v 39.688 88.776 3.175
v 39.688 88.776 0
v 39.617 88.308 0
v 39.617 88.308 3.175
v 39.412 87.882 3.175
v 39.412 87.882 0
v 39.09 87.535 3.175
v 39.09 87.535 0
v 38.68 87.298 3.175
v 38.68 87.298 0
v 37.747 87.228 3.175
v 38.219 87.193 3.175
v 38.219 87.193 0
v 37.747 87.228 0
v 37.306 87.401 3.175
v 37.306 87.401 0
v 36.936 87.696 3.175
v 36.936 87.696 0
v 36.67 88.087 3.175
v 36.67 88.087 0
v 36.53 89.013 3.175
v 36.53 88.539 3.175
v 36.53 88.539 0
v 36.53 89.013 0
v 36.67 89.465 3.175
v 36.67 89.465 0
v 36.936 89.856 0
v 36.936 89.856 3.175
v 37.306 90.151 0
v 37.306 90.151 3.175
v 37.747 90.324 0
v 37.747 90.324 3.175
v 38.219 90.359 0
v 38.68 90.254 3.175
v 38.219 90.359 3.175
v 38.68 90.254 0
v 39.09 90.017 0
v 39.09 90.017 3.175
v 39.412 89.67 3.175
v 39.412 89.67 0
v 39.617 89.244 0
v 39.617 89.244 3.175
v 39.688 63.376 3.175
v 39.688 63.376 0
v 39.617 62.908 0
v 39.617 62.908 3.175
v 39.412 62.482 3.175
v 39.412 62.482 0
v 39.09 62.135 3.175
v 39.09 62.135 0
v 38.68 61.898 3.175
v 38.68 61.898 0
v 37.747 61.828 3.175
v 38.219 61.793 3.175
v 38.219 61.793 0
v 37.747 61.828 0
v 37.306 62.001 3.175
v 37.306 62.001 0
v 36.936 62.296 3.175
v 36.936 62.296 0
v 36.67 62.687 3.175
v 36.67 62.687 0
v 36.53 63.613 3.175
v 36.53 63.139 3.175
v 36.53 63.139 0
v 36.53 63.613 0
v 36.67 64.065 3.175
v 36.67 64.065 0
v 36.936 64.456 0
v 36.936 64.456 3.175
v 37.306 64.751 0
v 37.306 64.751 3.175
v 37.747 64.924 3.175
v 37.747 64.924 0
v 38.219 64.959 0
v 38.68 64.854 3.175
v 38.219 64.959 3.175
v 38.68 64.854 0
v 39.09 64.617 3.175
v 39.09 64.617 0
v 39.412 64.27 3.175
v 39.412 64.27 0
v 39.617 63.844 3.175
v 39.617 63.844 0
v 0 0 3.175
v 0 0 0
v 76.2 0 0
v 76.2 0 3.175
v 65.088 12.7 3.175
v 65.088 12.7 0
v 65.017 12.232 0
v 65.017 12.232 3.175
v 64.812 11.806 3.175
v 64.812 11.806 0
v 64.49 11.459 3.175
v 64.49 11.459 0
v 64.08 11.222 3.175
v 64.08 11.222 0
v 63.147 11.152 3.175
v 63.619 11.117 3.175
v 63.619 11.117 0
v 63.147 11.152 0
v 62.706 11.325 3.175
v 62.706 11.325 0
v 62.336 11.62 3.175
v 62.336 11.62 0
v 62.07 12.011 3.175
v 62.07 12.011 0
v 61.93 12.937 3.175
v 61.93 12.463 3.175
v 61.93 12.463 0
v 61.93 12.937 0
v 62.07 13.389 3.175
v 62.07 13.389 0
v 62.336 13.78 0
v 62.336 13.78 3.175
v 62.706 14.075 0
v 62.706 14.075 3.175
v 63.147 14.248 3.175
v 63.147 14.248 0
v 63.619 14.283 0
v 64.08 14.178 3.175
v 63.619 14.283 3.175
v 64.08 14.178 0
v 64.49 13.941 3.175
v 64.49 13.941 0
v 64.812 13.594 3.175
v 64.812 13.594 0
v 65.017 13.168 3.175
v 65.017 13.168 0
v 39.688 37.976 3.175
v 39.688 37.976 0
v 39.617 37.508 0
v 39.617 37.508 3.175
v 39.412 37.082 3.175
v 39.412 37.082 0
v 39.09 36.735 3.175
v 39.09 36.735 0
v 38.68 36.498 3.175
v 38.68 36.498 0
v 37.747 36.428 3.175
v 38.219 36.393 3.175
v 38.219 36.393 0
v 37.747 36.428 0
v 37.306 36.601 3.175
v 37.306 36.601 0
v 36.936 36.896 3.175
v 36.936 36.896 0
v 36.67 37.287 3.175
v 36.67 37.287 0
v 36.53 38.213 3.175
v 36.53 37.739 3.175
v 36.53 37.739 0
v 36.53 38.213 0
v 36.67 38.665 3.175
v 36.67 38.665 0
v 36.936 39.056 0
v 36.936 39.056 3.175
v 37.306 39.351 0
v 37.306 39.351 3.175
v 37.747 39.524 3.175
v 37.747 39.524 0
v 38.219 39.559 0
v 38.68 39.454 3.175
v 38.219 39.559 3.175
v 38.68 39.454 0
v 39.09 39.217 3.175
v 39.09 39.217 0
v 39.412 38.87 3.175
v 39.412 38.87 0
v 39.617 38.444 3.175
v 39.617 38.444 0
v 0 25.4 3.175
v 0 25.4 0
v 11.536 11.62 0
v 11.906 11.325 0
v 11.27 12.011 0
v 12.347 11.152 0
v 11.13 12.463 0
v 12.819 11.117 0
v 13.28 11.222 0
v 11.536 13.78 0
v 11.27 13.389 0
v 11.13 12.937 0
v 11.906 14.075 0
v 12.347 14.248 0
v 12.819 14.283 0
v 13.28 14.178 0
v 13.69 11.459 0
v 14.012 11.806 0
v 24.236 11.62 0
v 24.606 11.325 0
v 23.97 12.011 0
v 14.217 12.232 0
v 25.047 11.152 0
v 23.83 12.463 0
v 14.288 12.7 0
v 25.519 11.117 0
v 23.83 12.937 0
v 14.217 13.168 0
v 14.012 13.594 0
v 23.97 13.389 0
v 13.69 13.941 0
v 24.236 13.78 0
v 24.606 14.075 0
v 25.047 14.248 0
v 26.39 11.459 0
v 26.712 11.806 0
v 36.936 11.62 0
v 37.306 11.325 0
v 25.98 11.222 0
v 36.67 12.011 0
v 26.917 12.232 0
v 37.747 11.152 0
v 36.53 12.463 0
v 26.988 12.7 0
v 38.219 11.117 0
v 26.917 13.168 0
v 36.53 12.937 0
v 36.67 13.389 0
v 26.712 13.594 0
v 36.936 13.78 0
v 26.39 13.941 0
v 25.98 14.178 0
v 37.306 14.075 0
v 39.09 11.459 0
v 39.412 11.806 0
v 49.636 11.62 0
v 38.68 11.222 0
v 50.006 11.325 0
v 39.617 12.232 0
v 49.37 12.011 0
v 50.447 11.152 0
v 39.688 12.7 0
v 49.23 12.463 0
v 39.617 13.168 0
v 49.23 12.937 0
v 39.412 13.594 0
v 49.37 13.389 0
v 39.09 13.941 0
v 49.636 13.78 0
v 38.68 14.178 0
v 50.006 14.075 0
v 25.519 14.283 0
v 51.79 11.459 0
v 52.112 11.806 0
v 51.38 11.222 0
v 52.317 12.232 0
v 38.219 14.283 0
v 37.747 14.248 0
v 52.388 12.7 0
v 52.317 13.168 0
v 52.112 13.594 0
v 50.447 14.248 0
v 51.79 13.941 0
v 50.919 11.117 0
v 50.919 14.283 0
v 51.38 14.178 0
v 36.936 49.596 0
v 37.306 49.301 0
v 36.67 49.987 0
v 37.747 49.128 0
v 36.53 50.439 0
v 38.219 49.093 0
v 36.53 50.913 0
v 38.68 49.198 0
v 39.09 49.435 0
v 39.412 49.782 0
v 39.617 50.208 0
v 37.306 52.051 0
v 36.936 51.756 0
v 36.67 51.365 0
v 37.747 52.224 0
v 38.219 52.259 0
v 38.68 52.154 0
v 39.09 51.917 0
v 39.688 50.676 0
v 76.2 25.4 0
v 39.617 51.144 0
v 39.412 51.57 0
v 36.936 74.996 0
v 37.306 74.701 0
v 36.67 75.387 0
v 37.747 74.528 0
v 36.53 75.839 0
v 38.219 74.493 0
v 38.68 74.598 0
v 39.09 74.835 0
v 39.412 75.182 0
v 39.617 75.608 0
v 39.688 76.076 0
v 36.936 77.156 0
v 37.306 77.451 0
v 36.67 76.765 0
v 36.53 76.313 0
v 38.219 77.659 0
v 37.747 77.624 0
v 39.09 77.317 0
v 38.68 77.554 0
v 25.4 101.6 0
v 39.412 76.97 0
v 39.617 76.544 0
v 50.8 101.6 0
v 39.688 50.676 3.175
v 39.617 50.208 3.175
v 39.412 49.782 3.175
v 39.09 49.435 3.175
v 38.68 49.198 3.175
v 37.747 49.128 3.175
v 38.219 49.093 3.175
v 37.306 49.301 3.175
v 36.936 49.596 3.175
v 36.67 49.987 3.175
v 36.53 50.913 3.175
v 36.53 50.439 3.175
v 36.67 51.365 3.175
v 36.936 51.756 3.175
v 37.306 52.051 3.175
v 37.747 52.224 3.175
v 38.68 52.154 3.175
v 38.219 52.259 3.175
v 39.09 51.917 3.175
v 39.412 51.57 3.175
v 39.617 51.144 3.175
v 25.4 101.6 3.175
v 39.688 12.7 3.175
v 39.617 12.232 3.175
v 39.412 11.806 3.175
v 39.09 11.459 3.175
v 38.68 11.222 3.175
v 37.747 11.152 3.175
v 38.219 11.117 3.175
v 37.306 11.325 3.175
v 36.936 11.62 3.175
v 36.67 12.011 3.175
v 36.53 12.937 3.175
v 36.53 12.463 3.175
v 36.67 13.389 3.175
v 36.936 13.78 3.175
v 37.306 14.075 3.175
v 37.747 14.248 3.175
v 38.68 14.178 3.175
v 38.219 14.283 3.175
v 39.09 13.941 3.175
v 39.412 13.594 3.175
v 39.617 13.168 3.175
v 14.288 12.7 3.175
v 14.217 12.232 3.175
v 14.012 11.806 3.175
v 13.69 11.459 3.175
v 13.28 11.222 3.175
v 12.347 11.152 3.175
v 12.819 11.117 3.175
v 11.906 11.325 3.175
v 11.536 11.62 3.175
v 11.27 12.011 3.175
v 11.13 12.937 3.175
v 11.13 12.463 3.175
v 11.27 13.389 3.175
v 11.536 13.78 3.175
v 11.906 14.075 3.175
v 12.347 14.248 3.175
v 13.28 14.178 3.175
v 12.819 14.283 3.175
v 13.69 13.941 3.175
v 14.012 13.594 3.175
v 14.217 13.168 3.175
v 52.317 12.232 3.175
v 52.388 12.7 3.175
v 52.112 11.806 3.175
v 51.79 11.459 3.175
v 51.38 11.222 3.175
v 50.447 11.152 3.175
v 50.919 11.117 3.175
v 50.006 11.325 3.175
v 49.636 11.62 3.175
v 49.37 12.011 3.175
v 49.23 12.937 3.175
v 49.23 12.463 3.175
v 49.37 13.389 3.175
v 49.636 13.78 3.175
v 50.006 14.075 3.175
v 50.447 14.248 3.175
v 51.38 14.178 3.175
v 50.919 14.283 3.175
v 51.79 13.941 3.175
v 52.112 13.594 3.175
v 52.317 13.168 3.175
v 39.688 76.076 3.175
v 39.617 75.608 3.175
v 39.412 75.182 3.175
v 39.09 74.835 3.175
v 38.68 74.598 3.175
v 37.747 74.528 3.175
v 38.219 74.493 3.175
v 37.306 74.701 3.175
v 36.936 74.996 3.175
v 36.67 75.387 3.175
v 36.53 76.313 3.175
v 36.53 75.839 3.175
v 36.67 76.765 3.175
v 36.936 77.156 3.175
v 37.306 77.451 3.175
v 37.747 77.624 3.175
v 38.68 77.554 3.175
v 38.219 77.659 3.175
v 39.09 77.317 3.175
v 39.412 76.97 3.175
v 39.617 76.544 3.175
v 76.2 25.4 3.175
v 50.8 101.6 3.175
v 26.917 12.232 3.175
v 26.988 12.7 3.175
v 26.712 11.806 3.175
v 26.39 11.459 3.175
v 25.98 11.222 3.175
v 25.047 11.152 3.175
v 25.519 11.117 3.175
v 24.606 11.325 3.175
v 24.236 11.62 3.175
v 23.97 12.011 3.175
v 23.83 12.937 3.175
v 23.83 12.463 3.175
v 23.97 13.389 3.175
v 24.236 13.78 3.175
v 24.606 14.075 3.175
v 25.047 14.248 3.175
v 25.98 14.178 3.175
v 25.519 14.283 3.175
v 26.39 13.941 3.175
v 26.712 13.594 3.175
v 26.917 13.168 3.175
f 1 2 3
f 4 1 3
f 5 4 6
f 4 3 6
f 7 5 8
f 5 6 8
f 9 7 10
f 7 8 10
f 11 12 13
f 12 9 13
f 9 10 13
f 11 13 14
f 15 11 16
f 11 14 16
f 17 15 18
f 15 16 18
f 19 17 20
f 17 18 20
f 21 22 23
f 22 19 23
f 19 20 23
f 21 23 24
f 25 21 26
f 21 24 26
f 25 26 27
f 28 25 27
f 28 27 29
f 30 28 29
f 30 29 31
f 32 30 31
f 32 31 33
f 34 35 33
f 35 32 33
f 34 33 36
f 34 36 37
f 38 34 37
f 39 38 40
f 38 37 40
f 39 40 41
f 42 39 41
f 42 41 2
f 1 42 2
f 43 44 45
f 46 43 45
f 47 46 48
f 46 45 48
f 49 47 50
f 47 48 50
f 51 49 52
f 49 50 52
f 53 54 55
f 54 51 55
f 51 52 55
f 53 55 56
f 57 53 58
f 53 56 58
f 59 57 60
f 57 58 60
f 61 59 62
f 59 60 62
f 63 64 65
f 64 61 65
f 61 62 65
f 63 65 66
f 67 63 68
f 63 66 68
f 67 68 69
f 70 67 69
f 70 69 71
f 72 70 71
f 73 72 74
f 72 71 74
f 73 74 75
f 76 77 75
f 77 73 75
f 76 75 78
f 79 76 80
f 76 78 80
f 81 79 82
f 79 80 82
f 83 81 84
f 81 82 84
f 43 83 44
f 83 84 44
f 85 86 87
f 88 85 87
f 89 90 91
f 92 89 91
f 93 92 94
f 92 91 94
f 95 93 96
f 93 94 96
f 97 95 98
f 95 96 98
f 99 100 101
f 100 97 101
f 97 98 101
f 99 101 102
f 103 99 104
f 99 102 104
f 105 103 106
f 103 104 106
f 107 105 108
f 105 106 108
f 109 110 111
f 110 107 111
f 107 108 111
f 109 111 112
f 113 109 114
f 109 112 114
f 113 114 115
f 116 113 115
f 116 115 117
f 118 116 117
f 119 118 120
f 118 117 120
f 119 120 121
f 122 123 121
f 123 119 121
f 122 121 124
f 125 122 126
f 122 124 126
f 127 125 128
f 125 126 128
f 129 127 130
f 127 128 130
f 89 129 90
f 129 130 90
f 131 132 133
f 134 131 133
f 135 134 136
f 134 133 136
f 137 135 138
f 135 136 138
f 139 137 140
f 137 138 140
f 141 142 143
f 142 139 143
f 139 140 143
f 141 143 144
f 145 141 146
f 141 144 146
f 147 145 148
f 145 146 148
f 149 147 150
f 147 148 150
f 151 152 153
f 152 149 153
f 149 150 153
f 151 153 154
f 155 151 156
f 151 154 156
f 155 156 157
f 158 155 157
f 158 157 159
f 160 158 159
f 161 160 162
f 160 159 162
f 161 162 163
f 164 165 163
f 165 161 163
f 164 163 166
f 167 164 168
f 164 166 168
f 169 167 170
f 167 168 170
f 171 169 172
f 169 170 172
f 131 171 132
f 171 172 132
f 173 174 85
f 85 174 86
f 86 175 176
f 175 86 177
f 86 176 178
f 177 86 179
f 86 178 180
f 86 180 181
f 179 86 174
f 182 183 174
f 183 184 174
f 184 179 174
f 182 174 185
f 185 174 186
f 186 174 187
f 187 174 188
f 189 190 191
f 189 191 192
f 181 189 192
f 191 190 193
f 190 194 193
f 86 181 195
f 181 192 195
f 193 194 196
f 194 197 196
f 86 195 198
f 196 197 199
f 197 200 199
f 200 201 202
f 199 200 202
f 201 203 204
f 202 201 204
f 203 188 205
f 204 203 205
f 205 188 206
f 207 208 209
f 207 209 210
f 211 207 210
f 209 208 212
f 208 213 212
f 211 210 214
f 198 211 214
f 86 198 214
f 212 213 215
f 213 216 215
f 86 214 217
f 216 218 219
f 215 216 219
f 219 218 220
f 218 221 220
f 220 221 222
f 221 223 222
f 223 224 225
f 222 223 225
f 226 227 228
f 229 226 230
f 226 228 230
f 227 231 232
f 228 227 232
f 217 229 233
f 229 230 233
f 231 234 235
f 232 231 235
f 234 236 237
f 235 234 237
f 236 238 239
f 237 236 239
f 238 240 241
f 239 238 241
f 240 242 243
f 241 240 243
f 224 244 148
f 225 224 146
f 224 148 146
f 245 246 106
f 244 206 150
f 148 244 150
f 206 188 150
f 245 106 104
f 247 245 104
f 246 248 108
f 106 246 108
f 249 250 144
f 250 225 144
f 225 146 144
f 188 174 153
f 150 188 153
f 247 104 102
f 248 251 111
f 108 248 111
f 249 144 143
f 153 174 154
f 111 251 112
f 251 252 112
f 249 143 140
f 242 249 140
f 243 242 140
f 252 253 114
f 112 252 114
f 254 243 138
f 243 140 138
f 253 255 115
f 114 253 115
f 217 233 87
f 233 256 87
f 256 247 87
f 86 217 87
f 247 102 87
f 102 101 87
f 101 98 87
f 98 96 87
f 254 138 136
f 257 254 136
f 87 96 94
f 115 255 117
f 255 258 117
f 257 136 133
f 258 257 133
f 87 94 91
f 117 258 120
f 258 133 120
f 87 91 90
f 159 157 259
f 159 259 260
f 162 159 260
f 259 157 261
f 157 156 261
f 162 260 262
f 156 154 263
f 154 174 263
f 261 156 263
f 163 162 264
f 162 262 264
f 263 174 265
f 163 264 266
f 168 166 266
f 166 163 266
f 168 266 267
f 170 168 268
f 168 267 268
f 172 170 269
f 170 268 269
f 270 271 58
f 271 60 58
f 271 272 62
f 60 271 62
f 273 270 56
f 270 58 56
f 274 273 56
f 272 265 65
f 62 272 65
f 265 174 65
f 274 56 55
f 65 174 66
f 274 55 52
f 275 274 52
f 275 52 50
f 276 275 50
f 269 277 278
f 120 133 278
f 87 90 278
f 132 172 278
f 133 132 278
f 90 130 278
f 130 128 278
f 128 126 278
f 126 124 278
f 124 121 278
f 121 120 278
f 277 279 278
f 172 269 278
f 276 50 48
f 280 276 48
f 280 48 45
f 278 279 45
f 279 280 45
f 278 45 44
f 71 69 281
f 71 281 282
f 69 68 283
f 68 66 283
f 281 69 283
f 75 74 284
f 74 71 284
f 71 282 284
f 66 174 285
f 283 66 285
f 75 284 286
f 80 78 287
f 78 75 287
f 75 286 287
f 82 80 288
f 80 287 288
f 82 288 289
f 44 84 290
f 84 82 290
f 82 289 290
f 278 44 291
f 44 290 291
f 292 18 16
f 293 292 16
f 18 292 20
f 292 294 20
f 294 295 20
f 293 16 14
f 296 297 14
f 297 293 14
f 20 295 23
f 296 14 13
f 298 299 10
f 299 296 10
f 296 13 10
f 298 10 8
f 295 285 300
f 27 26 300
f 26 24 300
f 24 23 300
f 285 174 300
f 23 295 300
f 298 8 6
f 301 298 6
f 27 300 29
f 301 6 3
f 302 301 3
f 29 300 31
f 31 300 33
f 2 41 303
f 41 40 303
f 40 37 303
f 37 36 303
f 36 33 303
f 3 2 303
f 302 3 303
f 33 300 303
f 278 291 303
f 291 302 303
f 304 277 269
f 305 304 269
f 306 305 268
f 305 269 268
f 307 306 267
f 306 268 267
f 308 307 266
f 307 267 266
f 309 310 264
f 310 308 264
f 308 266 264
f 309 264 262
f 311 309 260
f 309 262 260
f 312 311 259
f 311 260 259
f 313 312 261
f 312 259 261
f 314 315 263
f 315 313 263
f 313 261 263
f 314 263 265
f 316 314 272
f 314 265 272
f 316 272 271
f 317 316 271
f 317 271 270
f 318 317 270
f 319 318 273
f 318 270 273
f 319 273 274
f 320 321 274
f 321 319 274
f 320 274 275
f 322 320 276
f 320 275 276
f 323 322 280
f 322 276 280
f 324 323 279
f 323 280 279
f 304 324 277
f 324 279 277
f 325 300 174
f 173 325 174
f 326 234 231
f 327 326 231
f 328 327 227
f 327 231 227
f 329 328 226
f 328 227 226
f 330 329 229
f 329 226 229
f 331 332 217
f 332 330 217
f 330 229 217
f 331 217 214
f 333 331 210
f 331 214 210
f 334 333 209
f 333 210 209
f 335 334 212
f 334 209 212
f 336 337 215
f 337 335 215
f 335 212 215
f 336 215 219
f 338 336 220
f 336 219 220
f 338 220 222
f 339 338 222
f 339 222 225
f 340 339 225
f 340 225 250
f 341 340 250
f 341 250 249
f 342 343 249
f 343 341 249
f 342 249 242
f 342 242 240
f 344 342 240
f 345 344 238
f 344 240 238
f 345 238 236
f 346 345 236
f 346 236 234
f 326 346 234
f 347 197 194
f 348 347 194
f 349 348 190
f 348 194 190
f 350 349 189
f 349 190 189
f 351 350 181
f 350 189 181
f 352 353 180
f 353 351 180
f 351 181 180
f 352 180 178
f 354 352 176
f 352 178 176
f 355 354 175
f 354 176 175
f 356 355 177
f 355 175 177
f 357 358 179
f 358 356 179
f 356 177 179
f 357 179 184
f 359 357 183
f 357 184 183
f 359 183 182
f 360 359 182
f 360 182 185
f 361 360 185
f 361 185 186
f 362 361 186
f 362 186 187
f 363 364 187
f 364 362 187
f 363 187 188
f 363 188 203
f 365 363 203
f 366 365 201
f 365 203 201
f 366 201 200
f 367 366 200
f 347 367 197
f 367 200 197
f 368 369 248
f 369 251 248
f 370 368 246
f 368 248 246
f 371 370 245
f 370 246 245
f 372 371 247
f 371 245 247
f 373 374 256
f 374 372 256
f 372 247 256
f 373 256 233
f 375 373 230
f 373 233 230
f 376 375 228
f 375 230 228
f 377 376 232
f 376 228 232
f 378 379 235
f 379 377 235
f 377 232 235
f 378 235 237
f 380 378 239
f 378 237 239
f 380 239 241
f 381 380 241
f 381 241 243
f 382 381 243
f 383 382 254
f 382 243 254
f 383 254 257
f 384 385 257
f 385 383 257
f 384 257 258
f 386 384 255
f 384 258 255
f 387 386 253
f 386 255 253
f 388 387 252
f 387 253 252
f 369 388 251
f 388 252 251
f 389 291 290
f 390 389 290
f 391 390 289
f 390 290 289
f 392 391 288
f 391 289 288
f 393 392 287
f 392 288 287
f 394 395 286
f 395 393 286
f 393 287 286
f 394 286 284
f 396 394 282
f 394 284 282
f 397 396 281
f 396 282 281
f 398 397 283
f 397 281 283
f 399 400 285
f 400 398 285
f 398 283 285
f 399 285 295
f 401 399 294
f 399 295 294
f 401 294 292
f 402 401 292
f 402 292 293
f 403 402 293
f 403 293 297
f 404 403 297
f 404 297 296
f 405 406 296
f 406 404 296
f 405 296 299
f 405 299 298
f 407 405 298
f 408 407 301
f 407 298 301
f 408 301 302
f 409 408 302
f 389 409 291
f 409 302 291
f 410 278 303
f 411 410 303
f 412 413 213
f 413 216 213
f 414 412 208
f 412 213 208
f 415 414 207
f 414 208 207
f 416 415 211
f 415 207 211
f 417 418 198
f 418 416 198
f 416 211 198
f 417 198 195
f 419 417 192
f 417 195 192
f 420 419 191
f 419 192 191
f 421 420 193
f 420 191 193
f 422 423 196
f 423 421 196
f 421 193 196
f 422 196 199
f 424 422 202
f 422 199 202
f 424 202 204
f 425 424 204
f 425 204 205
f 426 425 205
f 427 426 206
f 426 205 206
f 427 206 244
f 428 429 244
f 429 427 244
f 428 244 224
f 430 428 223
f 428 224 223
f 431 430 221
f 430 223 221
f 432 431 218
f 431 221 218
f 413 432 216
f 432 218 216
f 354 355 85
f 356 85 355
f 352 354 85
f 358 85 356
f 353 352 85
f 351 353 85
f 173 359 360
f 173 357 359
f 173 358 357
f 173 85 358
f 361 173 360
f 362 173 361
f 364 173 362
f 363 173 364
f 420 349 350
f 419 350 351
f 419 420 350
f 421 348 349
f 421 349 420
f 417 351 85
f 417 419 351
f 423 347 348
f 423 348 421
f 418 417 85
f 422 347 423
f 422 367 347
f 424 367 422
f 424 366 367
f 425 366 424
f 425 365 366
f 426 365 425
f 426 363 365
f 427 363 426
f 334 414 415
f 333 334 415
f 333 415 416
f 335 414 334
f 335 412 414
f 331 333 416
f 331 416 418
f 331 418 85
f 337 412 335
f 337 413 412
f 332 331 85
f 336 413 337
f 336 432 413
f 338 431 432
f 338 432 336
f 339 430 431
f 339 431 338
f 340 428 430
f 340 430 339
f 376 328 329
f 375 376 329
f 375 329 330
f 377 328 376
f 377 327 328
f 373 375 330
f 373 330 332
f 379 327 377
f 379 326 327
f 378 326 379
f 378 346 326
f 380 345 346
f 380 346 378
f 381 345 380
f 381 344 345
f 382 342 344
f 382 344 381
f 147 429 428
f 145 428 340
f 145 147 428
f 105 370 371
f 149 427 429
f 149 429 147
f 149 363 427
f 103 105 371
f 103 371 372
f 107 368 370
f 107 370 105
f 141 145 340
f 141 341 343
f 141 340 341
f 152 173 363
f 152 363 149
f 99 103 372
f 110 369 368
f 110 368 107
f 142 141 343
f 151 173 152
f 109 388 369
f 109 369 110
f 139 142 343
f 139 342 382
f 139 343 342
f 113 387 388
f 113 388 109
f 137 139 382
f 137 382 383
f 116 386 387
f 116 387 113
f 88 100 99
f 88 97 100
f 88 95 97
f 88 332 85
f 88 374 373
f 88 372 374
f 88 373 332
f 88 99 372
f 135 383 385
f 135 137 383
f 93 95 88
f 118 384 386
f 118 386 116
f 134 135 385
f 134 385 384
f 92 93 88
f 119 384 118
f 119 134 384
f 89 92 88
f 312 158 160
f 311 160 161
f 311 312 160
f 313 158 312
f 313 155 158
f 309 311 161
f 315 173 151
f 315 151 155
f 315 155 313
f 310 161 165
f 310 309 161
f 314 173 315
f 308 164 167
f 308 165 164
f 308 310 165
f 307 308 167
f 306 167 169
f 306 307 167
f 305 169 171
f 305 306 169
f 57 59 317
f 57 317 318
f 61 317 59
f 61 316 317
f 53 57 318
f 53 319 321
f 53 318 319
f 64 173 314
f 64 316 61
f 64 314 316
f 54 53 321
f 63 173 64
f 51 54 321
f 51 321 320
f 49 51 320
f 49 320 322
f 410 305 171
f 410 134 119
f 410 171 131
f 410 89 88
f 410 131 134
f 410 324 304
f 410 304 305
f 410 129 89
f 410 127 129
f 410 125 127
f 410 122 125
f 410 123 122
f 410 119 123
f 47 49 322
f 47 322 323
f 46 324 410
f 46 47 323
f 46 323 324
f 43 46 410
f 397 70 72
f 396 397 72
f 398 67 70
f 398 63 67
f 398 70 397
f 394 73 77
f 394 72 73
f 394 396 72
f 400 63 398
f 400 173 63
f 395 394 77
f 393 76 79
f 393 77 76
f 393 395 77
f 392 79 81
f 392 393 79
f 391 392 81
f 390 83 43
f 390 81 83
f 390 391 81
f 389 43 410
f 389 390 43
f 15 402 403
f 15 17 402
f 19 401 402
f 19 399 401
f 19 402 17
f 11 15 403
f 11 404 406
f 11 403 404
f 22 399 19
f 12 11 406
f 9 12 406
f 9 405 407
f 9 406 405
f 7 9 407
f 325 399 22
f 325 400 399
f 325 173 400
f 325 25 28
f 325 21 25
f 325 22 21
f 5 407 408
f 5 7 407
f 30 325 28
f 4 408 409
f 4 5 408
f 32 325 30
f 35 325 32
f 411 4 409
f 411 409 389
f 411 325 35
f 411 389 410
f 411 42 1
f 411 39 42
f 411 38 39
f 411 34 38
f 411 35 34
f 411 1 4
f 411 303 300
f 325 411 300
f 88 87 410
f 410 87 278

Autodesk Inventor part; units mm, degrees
ref_plane "YZ Plane" through (0, 0, 0) normal (1, 0, 0) x (0, 1, 0)
ref_plane "XZ Plane" through (0, 0, 0) normal (0, 1, 0) x (-1, 0, 0)
ref_plane "XY Plane" through (0, 0, 0) normal (0, 0, 1) x (1, 0, 0)
sketch "Sketch1" plane through (0, 0, 0) normal (0, 0, 1) x (1, 0, 0)
  line L0 (0, 0) -> (76.2, 0)
  line L1 (76.2, 0) -> (76.2, 25.4)
  line L2 (76.2, 25.4) -> (50.8, 101.6)
  line L3 (50.8, 101.6) -> (25.4, 101.6)
  line L4 (25.4, 101.6) -> (0, 25.4)
  line L5 (0, 25.4) -> (0, 0)
  line L6 (0, 25.4) -> (76.2, 25.4) construction
  line L7 (25.4, 101.6) -> (25.4, 25.4) construction
  line L8 (50.8, 101.6) -> (50.8, 25.4) construction
  circle A0 centre (12.7, 12.7) radius 1.5875
  circle A1 centre (25.4, 12.7) radius 1.5875
  circle A2 centre (38.1, 12.7) radius 1.5875
  circle A3 centre (50.8, 12.7) radius 1.5875
  circle A4 centre (63.5, 12.7) radius 1.5875
  circle A5 centre (38.1, 88.7759) radius 1.5875
  circle A6 centre (38.1, 76.0759) radius 1.5875
  circle A7 centre (38.1, 63.3759) radius 1.5875
  circle A8 centre (38.1, 50.6759) radius 1.5875
  circle A9 centre (38.1, 37.9759) radius 1.5875
  dimension "d0" = 25.4
  dimension "d1" = 76.2
  dimension "d2" = 101.6
  dimension "d3" = 12.7
  dimension "d4" = 12.7
  dimension "d7" = 12.7
  dimension "d12" = 3.175
  dimension "d13" = 12.8241
  dimension "d14" = 12.7
  dimension "d17" = 12.7
extrude "Extrusion1" add sketch "Sketch1" along normal blind 3.175
equation "\"d4\" = d3"
properties part number "8 ball frame gusset"
